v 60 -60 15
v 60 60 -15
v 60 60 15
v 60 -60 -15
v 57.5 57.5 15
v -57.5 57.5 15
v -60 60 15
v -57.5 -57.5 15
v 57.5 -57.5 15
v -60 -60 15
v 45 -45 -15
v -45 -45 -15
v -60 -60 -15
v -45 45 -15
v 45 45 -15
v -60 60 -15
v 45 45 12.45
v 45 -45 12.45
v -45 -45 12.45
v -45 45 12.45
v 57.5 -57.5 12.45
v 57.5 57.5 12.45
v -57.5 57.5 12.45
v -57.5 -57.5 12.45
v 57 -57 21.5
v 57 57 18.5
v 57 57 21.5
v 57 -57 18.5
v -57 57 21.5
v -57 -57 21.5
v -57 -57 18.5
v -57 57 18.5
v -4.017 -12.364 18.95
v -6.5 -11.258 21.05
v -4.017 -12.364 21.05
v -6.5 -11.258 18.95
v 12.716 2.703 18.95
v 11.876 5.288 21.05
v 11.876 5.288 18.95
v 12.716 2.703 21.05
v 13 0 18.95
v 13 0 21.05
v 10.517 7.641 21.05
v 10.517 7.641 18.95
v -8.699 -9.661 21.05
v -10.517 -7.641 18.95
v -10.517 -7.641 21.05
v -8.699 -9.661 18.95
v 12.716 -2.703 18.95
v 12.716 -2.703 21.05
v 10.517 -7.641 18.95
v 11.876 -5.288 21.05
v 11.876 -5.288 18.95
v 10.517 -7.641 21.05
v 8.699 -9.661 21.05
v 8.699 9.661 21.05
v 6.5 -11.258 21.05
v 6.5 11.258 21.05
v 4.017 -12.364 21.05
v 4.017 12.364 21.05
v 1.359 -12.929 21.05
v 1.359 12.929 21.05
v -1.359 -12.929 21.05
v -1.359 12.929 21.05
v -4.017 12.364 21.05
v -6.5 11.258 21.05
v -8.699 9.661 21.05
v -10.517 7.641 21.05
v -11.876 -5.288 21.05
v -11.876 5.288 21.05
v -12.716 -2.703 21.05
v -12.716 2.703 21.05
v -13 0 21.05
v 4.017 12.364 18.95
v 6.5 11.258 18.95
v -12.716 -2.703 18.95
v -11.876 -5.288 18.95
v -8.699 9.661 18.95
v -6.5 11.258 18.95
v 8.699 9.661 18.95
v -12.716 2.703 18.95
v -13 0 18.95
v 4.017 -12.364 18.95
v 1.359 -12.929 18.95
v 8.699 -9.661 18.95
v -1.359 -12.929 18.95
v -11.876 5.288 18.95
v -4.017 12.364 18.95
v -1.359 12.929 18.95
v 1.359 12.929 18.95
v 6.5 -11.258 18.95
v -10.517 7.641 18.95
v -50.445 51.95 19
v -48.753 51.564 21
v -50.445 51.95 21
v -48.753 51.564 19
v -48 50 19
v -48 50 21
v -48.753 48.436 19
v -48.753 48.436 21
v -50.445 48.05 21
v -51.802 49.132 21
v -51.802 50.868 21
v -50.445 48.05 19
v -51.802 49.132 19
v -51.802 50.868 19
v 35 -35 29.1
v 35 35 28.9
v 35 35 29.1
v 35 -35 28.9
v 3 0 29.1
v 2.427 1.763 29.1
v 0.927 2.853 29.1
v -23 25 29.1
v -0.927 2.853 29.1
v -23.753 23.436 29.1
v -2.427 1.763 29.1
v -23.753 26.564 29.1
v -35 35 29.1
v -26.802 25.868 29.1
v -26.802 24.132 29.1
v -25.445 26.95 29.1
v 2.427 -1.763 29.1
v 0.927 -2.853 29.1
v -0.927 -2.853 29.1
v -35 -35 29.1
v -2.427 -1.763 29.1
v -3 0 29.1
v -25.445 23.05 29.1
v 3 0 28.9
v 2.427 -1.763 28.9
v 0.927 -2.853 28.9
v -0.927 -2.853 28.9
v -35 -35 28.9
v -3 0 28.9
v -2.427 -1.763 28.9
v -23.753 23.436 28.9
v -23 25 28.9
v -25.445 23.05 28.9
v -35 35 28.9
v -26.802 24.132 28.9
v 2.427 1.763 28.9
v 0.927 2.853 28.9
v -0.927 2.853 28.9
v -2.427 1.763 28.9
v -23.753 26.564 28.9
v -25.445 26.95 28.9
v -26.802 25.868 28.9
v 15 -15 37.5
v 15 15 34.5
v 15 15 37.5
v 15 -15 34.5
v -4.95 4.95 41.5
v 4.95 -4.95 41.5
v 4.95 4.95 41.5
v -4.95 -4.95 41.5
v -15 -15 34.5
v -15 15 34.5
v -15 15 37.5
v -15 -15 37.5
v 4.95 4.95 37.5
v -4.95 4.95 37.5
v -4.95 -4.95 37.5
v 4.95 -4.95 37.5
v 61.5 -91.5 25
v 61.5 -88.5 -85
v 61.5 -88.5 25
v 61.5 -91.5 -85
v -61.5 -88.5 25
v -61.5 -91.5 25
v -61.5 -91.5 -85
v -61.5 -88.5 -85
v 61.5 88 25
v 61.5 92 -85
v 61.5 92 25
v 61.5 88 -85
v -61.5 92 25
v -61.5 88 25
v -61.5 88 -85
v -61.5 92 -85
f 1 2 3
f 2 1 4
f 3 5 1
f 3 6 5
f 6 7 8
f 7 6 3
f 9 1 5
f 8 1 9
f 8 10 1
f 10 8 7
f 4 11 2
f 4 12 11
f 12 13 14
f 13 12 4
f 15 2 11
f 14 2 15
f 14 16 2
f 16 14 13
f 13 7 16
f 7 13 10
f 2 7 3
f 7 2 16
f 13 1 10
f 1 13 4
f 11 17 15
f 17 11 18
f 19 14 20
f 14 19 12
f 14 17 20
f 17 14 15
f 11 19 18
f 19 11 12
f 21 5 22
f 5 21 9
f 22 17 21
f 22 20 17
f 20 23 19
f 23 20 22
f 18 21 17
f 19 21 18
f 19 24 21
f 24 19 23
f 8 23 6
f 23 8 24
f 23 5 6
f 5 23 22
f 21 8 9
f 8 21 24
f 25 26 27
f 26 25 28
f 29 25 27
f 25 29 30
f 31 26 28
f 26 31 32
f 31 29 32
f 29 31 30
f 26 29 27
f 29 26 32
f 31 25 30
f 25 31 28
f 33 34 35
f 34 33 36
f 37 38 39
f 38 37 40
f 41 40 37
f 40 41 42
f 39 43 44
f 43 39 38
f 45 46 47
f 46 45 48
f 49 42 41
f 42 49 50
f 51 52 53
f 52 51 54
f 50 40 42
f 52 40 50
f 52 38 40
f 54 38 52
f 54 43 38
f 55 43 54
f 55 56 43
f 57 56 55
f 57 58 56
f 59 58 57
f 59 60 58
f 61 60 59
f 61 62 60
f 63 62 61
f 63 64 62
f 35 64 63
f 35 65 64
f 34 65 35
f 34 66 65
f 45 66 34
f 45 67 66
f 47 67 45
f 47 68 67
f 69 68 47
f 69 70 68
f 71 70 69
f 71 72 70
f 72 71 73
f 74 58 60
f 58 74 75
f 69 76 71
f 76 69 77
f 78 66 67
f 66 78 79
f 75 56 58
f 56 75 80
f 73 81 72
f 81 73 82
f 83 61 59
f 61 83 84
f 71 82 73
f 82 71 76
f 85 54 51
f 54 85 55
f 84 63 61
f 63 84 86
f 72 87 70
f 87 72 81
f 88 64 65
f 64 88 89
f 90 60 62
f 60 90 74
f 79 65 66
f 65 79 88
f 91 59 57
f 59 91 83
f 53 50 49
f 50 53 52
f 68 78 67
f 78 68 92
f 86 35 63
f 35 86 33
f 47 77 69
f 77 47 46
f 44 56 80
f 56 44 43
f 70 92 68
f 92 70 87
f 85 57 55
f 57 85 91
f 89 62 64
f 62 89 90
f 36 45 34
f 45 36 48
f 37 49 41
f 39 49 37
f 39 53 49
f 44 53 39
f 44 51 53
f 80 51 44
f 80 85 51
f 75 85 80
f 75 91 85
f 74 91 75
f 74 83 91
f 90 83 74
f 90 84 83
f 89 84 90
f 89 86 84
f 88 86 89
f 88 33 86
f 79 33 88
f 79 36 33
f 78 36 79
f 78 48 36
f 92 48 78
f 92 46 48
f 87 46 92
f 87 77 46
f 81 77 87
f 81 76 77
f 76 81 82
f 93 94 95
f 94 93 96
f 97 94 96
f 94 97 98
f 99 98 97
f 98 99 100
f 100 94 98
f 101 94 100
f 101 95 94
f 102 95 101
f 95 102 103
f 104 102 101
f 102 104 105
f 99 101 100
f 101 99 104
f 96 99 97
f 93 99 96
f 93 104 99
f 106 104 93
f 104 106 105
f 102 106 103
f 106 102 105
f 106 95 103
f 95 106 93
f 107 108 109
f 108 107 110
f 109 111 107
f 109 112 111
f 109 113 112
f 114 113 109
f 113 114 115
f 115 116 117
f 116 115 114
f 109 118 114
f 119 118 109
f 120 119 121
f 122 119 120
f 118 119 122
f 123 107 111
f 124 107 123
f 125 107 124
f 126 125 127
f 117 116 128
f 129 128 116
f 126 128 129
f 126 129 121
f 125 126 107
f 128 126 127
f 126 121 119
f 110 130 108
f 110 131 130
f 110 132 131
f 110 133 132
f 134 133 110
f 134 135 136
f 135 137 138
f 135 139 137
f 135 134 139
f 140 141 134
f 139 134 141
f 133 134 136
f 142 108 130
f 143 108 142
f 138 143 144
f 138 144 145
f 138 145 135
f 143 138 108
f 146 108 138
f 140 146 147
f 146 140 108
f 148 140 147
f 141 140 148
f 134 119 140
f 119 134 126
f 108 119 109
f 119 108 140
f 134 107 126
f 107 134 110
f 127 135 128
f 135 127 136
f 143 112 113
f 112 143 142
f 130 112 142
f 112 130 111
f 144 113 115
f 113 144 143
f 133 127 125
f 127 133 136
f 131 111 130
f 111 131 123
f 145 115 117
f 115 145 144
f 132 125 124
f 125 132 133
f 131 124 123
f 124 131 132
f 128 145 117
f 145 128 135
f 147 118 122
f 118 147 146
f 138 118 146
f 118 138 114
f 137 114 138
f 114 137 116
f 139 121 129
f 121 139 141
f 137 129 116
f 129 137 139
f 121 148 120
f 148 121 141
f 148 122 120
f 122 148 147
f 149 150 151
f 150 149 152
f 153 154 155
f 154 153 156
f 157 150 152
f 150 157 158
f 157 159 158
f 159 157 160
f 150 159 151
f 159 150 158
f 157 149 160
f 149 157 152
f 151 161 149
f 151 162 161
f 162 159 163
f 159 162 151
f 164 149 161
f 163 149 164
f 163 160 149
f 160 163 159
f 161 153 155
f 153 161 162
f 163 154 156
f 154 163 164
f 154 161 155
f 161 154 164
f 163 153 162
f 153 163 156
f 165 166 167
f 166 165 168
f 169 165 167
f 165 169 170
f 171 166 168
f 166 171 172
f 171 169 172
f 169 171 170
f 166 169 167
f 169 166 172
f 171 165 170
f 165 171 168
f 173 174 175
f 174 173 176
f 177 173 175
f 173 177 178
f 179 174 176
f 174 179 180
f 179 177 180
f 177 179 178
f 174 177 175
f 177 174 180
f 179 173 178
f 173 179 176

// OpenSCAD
// parameters
t_x=30; // translation
t_y=30; // translation
//front dimension
d_cube=120; //
//
translate([0,-2*t_y-30,-30])
cube([d_cube+3,3,110], center=true);
translate([0,2*t_x+30,-30])
cube([d_cube+3,4,110], center=true);
difference(){
    //Cube
    cube([d_cube,d_cube,30], center=true);
    //cubr_2
    cube([90,90,32], center=true);
    translate([0,0,15])
    cube([115,115,5.1], center=true);
    }
translate([0,0,20])
difference(){
color("blue")
    //Cube
    cube([114,114,3], center=true);
     // Cylinder 1
    cylinder(h=2.1,r=13, center=true);
    //cubr_2
        translate([-50,50,0])
    cylinder(h=2,r=2, center=true);
    }

    translate([0,0,29])

difference(){
color("red")
   //Cube
    cube([70,70,0.2], center=true);
         //  text(Hayth,size=11, halign="left", valign="baseline", spacing=1,direction="ltr", language="en", script="Latin");
     // Cylinder 1
    cylinder(h=2.1,r=3, center=true);
    //cubr_2
        translate([-25,25,0])
    cylinder(h=2,r=2, center=true);
    }
    
    
translate([0,0,38])
difference(){
color("black")
    //Cube
    cube([30,30,7], center=true);
     // Cylinder 1
    translate([0,10,2])
    cube([30.1,10.1,5],center=true);
    translate([0,-10,2])
    cube([30.1,10.1,5],center=true);
        translate([10,0,2])
    cube([10.1,10.1,5],center=true);
            translate([-10,0,2])
    cube([10.1,10.1,5],center=true);
    }
